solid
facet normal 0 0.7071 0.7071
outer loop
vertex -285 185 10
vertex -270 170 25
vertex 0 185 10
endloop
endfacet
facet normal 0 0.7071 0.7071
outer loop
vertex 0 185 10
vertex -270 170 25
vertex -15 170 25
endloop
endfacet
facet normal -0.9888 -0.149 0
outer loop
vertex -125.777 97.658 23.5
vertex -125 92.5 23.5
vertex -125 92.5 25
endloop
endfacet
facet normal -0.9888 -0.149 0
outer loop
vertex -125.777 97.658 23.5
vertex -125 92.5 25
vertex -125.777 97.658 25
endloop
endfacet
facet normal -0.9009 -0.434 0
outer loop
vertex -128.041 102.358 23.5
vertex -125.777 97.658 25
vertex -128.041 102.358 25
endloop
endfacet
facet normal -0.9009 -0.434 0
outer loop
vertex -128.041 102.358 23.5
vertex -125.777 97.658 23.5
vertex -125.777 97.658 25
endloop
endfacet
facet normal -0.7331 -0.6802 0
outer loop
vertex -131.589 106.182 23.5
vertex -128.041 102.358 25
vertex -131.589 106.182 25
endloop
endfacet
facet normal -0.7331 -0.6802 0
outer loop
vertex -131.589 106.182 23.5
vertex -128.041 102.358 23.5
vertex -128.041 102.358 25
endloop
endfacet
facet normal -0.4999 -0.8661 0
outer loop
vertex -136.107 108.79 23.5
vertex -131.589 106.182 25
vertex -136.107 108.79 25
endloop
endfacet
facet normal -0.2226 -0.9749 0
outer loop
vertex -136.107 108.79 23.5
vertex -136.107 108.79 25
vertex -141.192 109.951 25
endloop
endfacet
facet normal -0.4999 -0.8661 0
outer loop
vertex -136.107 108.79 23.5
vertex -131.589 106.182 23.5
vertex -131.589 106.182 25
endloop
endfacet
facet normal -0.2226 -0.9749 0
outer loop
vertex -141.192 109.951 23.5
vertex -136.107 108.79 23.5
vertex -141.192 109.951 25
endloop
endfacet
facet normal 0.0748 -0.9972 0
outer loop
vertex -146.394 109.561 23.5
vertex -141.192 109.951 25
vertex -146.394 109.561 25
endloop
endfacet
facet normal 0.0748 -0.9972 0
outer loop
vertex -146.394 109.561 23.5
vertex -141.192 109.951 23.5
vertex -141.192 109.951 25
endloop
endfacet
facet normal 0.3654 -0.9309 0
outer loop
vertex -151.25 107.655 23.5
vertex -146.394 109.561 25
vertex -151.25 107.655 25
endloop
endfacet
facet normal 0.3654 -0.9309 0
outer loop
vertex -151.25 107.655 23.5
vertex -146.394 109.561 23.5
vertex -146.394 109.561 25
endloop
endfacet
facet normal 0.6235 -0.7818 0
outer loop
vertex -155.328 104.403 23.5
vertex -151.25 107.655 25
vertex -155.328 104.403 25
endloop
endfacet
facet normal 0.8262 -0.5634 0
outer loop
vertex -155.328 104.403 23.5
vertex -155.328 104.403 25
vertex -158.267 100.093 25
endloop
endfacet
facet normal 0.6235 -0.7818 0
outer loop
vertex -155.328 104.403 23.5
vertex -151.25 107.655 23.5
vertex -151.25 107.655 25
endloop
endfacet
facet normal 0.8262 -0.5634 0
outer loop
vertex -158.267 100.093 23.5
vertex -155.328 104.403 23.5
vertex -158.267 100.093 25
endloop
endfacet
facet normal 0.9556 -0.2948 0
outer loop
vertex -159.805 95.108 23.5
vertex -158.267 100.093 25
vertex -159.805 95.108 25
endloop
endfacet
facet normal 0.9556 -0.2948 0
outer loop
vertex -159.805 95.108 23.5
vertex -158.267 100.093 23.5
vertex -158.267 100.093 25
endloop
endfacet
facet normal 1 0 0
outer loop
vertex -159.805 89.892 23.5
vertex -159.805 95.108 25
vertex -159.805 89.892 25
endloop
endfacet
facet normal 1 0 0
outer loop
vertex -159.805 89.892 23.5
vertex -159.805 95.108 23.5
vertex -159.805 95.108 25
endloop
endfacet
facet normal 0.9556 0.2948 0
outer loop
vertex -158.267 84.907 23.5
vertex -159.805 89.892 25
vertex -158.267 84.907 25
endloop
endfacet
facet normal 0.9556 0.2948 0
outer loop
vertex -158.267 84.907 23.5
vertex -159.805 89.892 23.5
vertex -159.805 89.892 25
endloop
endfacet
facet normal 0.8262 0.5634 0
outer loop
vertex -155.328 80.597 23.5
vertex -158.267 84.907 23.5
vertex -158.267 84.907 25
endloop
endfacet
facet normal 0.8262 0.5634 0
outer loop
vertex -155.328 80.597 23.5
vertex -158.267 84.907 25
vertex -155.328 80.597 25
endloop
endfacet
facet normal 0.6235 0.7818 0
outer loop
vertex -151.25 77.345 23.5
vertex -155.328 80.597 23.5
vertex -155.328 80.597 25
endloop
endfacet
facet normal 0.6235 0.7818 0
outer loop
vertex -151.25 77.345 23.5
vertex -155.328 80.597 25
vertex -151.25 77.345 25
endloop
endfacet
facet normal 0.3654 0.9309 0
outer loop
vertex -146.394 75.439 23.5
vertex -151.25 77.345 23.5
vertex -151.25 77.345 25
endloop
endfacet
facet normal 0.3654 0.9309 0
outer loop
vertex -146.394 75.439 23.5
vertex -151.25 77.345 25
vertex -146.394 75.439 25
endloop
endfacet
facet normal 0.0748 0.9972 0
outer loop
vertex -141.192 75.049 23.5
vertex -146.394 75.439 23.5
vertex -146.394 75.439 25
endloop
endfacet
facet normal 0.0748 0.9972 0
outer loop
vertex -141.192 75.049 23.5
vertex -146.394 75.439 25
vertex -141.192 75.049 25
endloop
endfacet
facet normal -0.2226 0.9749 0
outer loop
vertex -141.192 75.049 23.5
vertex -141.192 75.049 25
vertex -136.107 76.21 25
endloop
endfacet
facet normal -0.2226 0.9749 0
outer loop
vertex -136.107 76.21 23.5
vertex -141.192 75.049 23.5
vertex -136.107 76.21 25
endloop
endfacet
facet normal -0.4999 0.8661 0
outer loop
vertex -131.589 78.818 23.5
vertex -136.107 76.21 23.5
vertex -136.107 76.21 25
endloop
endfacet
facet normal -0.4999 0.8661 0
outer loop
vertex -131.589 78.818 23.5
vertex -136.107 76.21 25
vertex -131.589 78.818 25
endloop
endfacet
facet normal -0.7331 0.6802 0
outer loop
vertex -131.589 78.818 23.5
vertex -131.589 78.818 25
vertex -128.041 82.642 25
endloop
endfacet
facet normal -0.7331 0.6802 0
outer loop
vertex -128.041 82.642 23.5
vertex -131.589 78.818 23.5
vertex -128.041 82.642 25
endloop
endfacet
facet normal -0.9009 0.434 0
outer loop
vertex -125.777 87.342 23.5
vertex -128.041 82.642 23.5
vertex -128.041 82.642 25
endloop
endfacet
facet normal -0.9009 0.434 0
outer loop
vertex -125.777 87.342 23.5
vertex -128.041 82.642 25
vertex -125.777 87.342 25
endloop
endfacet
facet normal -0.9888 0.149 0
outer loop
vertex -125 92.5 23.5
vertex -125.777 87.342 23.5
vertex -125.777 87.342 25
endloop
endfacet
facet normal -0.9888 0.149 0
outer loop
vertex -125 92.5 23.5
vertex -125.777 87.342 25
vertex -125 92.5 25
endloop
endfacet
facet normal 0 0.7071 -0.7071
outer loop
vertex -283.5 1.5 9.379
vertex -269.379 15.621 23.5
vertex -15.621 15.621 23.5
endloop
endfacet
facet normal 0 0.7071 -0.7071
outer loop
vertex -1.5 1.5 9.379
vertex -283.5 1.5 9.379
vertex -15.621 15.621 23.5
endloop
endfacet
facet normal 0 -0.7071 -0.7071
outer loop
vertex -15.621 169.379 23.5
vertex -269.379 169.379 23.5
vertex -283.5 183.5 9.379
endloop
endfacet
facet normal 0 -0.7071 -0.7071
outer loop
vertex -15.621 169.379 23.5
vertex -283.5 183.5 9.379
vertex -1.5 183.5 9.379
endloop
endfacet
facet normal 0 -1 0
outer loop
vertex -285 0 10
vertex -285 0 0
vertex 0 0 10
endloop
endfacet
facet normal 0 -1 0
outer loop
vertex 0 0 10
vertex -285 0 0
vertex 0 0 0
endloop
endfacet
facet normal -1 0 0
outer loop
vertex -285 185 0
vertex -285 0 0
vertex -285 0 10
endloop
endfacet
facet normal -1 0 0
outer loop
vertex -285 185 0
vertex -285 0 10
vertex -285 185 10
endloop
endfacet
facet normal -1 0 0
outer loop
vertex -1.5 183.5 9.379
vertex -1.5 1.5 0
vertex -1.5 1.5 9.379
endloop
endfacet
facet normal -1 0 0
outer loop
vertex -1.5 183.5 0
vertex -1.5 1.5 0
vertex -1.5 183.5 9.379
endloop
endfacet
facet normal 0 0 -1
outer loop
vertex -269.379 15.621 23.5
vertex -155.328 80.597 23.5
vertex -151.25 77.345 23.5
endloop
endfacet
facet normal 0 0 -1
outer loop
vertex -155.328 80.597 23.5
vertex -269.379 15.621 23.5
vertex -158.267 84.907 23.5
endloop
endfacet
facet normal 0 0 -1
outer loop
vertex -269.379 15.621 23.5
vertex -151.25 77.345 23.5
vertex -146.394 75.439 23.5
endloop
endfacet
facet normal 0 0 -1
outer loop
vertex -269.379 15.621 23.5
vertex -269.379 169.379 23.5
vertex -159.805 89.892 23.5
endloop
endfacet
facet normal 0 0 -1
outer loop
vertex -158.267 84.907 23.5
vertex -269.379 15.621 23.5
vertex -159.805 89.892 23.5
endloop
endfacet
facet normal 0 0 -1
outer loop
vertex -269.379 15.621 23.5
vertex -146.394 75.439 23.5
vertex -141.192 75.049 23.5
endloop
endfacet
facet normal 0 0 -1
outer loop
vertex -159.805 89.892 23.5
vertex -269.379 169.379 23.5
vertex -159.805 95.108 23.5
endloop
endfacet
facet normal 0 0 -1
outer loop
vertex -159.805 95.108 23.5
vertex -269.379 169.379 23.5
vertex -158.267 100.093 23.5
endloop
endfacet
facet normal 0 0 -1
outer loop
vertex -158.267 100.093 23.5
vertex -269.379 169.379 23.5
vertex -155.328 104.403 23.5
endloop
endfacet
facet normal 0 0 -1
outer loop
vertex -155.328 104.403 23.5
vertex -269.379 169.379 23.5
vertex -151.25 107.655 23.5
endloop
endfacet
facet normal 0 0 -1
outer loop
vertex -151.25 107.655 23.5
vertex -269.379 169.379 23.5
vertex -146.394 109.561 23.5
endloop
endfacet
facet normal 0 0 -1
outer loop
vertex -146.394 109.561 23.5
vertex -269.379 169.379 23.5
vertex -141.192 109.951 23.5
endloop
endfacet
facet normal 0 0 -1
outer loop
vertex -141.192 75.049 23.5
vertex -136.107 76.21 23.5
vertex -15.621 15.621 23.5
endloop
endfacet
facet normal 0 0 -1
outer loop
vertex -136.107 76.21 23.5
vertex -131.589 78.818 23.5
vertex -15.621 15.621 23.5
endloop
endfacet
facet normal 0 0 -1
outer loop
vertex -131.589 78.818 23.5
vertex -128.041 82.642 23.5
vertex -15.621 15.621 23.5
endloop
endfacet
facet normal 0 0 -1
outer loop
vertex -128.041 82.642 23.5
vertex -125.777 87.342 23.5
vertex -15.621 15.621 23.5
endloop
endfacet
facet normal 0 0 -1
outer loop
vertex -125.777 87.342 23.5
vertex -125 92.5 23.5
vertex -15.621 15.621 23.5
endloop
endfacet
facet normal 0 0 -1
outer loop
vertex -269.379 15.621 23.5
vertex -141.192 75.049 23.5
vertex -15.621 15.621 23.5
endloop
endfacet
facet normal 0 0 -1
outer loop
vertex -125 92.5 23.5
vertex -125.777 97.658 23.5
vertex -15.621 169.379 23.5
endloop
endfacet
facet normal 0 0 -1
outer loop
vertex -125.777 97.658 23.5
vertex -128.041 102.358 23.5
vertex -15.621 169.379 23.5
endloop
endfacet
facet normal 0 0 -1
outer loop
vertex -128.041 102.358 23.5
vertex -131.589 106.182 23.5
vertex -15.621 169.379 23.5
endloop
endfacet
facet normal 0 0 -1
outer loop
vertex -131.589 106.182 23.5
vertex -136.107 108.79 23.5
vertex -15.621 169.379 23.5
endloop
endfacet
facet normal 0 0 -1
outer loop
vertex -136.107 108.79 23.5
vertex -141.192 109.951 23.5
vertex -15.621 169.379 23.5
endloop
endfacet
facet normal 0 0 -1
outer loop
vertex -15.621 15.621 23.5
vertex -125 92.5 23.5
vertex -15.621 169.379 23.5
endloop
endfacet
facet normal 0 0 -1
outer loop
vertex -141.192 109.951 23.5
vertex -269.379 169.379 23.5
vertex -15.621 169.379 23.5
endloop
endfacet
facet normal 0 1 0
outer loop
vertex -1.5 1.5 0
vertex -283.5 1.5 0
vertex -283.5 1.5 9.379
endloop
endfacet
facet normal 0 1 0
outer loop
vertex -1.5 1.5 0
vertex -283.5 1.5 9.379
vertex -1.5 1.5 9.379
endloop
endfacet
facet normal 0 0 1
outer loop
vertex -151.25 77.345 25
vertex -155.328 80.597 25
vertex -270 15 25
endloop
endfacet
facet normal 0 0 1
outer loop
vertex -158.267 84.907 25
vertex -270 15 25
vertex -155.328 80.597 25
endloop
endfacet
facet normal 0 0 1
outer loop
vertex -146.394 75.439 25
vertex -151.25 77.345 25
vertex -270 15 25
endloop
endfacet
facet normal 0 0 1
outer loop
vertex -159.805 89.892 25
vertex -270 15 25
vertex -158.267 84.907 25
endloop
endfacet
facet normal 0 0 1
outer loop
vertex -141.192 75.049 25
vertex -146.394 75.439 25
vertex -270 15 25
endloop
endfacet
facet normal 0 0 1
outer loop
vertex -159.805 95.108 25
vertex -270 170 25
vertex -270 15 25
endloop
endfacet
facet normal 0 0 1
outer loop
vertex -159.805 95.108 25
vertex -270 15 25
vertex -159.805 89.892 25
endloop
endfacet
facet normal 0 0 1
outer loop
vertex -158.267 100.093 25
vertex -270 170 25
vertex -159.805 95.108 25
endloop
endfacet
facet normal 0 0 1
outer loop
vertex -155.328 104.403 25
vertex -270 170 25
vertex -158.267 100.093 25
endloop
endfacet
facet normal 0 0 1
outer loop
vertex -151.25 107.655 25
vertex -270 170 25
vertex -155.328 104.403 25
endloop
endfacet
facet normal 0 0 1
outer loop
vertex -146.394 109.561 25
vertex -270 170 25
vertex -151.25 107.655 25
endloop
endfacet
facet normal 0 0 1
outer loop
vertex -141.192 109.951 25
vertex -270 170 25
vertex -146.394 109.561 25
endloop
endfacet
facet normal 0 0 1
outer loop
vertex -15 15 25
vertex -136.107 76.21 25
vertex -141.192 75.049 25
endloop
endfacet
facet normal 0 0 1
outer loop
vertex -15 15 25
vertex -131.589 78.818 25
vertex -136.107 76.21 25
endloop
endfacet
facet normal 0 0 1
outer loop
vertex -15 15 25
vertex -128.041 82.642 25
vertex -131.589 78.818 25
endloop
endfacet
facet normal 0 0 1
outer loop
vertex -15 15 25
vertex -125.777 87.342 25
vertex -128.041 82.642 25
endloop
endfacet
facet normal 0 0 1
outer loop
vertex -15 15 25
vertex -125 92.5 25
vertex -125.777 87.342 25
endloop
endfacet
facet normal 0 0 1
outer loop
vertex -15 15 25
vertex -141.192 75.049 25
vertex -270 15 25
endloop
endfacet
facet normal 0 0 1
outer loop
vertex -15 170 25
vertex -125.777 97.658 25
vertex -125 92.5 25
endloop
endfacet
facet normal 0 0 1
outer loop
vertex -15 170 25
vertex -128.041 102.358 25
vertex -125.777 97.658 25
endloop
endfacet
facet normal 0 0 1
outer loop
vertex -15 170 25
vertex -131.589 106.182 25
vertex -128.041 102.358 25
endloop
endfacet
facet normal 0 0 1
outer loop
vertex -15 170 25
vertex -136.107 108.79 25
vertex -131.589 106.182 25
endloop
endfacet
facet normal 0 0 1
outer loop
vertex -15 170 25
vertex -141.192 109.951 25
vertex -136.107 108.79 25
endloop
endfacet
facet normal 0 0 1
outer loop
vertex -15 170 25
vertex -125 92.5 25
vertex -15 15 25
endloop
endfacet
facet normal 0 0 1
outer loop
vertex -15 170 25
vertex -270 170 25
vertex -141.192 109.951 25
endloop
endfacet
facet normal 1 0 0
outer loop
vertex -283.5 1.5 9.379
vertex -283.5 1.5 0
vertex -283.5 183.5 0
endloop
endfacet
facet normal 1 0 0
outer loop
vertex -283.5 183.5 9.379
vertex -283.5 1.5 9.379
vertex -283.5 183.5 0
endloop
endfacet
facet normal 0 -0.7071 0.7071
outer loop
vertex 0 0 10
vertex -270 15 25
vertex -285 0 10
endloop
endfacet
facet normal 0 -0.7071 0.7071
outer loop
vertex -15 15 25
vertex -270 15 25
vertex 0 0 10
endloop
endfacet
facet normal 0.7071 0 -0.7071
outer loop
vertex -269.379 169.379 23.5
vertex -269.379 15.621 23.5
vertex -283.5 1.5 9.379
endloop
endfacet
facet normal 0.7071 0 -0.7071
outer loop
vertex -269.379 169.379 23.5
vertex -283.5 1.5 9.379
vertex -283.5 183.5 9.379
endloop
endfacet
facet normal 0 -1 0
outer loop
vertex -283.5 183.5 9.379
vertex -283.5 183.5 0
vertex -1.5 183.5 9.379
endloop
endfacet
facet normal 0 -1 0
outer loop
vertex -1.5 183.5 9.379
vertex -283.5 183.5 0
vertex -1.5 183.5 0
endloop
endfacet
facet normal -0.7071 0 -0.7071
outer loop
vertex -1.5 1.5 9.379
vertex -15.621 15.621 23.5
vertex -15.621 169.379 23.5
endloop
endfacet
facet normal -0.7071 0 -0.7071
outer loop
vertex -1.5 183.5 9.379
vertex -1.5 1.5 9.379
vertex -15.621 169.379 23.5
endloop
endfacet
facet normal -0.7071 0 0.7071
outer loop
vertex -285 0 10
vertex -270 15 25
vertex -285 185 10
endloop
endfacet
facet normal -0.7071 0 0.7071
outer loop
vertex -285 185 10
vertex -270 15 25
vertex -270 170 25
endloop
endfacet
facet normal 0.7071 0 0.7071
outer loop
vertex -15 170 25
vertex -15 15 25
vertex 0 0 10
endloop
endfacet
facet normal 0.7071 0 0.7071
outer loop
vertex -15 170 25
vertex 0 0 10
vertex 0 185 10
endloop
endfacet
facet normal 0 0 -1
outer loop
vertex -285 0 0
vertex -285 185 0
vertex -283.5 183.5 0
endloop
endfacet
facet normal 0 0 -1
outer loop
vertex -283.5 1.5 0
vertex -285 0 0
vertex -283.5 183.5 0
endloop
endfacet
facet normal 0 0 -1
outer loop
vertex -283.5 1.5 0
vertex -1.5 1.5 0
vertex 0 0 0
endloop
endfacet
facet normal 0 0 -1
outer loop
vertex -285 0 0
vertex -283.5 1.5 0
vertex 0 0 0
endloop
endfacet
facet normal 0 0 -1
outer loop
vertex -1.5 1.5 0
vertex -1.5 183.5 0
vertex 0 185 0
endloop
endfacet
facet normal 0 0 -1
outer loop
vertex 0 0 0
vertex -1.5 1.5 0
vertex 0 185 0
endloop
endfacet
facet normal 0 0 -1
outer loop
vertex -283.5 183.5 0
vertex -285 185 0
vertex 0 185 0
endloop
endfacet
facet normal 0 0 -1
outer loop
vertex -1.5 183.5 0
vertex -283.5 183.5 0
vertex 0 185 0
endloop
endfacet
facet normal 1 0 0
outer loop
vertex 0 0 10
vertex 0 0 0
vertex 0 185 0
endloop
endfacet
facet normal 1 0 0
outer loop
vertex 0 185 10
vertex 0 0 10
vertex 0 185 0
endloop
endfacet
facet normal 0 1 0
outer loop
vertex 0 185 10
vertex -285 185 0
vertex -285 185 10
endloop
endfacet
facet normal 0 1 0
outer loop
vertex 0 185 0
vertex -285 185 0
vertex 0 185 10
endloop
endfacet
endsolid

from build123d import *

# Parameters (mm, degrees)
F0_W     = 285
F0_H     = 185
F0_R     = 17.5
F1_DEPTH = 25
F2_SIZE  = 15
F3_T     = -1.5


with BuildPart() as f1:
    # F0 (on Top) → F1 (new body)
    with BuildSketch(Plane.XY):
        with Locations((-142.5, 92.5)):
            Rectangle(F0_W, F0_H)
        with Locations((-142.5, 92.5)):
            Circle(F0_R, mode=Mode.SUBTRACT)
    extrude(amount=F1_DEPTH)

    # F2
    f2_edges = [f1.edges().sort_by_distance(p)[0] for p in [
        (0, 92.5, 25),
        (-142.5, 185, 25),
        (-285, 92.5, 25),
        (-142.5, 0, 25),
    ]]
    chamfer(f2_edges, length=F2_SIZE)

    # F3
    f3_openings = [f1.faces().sort_by_distance(p)[0] for p in [
        (-142.5, 3.397793, 0),
        (-160, 92.5, 12.5),
    ]]
    offset(amount=F3_T, openings=f3_openings)


solid = f1.part
